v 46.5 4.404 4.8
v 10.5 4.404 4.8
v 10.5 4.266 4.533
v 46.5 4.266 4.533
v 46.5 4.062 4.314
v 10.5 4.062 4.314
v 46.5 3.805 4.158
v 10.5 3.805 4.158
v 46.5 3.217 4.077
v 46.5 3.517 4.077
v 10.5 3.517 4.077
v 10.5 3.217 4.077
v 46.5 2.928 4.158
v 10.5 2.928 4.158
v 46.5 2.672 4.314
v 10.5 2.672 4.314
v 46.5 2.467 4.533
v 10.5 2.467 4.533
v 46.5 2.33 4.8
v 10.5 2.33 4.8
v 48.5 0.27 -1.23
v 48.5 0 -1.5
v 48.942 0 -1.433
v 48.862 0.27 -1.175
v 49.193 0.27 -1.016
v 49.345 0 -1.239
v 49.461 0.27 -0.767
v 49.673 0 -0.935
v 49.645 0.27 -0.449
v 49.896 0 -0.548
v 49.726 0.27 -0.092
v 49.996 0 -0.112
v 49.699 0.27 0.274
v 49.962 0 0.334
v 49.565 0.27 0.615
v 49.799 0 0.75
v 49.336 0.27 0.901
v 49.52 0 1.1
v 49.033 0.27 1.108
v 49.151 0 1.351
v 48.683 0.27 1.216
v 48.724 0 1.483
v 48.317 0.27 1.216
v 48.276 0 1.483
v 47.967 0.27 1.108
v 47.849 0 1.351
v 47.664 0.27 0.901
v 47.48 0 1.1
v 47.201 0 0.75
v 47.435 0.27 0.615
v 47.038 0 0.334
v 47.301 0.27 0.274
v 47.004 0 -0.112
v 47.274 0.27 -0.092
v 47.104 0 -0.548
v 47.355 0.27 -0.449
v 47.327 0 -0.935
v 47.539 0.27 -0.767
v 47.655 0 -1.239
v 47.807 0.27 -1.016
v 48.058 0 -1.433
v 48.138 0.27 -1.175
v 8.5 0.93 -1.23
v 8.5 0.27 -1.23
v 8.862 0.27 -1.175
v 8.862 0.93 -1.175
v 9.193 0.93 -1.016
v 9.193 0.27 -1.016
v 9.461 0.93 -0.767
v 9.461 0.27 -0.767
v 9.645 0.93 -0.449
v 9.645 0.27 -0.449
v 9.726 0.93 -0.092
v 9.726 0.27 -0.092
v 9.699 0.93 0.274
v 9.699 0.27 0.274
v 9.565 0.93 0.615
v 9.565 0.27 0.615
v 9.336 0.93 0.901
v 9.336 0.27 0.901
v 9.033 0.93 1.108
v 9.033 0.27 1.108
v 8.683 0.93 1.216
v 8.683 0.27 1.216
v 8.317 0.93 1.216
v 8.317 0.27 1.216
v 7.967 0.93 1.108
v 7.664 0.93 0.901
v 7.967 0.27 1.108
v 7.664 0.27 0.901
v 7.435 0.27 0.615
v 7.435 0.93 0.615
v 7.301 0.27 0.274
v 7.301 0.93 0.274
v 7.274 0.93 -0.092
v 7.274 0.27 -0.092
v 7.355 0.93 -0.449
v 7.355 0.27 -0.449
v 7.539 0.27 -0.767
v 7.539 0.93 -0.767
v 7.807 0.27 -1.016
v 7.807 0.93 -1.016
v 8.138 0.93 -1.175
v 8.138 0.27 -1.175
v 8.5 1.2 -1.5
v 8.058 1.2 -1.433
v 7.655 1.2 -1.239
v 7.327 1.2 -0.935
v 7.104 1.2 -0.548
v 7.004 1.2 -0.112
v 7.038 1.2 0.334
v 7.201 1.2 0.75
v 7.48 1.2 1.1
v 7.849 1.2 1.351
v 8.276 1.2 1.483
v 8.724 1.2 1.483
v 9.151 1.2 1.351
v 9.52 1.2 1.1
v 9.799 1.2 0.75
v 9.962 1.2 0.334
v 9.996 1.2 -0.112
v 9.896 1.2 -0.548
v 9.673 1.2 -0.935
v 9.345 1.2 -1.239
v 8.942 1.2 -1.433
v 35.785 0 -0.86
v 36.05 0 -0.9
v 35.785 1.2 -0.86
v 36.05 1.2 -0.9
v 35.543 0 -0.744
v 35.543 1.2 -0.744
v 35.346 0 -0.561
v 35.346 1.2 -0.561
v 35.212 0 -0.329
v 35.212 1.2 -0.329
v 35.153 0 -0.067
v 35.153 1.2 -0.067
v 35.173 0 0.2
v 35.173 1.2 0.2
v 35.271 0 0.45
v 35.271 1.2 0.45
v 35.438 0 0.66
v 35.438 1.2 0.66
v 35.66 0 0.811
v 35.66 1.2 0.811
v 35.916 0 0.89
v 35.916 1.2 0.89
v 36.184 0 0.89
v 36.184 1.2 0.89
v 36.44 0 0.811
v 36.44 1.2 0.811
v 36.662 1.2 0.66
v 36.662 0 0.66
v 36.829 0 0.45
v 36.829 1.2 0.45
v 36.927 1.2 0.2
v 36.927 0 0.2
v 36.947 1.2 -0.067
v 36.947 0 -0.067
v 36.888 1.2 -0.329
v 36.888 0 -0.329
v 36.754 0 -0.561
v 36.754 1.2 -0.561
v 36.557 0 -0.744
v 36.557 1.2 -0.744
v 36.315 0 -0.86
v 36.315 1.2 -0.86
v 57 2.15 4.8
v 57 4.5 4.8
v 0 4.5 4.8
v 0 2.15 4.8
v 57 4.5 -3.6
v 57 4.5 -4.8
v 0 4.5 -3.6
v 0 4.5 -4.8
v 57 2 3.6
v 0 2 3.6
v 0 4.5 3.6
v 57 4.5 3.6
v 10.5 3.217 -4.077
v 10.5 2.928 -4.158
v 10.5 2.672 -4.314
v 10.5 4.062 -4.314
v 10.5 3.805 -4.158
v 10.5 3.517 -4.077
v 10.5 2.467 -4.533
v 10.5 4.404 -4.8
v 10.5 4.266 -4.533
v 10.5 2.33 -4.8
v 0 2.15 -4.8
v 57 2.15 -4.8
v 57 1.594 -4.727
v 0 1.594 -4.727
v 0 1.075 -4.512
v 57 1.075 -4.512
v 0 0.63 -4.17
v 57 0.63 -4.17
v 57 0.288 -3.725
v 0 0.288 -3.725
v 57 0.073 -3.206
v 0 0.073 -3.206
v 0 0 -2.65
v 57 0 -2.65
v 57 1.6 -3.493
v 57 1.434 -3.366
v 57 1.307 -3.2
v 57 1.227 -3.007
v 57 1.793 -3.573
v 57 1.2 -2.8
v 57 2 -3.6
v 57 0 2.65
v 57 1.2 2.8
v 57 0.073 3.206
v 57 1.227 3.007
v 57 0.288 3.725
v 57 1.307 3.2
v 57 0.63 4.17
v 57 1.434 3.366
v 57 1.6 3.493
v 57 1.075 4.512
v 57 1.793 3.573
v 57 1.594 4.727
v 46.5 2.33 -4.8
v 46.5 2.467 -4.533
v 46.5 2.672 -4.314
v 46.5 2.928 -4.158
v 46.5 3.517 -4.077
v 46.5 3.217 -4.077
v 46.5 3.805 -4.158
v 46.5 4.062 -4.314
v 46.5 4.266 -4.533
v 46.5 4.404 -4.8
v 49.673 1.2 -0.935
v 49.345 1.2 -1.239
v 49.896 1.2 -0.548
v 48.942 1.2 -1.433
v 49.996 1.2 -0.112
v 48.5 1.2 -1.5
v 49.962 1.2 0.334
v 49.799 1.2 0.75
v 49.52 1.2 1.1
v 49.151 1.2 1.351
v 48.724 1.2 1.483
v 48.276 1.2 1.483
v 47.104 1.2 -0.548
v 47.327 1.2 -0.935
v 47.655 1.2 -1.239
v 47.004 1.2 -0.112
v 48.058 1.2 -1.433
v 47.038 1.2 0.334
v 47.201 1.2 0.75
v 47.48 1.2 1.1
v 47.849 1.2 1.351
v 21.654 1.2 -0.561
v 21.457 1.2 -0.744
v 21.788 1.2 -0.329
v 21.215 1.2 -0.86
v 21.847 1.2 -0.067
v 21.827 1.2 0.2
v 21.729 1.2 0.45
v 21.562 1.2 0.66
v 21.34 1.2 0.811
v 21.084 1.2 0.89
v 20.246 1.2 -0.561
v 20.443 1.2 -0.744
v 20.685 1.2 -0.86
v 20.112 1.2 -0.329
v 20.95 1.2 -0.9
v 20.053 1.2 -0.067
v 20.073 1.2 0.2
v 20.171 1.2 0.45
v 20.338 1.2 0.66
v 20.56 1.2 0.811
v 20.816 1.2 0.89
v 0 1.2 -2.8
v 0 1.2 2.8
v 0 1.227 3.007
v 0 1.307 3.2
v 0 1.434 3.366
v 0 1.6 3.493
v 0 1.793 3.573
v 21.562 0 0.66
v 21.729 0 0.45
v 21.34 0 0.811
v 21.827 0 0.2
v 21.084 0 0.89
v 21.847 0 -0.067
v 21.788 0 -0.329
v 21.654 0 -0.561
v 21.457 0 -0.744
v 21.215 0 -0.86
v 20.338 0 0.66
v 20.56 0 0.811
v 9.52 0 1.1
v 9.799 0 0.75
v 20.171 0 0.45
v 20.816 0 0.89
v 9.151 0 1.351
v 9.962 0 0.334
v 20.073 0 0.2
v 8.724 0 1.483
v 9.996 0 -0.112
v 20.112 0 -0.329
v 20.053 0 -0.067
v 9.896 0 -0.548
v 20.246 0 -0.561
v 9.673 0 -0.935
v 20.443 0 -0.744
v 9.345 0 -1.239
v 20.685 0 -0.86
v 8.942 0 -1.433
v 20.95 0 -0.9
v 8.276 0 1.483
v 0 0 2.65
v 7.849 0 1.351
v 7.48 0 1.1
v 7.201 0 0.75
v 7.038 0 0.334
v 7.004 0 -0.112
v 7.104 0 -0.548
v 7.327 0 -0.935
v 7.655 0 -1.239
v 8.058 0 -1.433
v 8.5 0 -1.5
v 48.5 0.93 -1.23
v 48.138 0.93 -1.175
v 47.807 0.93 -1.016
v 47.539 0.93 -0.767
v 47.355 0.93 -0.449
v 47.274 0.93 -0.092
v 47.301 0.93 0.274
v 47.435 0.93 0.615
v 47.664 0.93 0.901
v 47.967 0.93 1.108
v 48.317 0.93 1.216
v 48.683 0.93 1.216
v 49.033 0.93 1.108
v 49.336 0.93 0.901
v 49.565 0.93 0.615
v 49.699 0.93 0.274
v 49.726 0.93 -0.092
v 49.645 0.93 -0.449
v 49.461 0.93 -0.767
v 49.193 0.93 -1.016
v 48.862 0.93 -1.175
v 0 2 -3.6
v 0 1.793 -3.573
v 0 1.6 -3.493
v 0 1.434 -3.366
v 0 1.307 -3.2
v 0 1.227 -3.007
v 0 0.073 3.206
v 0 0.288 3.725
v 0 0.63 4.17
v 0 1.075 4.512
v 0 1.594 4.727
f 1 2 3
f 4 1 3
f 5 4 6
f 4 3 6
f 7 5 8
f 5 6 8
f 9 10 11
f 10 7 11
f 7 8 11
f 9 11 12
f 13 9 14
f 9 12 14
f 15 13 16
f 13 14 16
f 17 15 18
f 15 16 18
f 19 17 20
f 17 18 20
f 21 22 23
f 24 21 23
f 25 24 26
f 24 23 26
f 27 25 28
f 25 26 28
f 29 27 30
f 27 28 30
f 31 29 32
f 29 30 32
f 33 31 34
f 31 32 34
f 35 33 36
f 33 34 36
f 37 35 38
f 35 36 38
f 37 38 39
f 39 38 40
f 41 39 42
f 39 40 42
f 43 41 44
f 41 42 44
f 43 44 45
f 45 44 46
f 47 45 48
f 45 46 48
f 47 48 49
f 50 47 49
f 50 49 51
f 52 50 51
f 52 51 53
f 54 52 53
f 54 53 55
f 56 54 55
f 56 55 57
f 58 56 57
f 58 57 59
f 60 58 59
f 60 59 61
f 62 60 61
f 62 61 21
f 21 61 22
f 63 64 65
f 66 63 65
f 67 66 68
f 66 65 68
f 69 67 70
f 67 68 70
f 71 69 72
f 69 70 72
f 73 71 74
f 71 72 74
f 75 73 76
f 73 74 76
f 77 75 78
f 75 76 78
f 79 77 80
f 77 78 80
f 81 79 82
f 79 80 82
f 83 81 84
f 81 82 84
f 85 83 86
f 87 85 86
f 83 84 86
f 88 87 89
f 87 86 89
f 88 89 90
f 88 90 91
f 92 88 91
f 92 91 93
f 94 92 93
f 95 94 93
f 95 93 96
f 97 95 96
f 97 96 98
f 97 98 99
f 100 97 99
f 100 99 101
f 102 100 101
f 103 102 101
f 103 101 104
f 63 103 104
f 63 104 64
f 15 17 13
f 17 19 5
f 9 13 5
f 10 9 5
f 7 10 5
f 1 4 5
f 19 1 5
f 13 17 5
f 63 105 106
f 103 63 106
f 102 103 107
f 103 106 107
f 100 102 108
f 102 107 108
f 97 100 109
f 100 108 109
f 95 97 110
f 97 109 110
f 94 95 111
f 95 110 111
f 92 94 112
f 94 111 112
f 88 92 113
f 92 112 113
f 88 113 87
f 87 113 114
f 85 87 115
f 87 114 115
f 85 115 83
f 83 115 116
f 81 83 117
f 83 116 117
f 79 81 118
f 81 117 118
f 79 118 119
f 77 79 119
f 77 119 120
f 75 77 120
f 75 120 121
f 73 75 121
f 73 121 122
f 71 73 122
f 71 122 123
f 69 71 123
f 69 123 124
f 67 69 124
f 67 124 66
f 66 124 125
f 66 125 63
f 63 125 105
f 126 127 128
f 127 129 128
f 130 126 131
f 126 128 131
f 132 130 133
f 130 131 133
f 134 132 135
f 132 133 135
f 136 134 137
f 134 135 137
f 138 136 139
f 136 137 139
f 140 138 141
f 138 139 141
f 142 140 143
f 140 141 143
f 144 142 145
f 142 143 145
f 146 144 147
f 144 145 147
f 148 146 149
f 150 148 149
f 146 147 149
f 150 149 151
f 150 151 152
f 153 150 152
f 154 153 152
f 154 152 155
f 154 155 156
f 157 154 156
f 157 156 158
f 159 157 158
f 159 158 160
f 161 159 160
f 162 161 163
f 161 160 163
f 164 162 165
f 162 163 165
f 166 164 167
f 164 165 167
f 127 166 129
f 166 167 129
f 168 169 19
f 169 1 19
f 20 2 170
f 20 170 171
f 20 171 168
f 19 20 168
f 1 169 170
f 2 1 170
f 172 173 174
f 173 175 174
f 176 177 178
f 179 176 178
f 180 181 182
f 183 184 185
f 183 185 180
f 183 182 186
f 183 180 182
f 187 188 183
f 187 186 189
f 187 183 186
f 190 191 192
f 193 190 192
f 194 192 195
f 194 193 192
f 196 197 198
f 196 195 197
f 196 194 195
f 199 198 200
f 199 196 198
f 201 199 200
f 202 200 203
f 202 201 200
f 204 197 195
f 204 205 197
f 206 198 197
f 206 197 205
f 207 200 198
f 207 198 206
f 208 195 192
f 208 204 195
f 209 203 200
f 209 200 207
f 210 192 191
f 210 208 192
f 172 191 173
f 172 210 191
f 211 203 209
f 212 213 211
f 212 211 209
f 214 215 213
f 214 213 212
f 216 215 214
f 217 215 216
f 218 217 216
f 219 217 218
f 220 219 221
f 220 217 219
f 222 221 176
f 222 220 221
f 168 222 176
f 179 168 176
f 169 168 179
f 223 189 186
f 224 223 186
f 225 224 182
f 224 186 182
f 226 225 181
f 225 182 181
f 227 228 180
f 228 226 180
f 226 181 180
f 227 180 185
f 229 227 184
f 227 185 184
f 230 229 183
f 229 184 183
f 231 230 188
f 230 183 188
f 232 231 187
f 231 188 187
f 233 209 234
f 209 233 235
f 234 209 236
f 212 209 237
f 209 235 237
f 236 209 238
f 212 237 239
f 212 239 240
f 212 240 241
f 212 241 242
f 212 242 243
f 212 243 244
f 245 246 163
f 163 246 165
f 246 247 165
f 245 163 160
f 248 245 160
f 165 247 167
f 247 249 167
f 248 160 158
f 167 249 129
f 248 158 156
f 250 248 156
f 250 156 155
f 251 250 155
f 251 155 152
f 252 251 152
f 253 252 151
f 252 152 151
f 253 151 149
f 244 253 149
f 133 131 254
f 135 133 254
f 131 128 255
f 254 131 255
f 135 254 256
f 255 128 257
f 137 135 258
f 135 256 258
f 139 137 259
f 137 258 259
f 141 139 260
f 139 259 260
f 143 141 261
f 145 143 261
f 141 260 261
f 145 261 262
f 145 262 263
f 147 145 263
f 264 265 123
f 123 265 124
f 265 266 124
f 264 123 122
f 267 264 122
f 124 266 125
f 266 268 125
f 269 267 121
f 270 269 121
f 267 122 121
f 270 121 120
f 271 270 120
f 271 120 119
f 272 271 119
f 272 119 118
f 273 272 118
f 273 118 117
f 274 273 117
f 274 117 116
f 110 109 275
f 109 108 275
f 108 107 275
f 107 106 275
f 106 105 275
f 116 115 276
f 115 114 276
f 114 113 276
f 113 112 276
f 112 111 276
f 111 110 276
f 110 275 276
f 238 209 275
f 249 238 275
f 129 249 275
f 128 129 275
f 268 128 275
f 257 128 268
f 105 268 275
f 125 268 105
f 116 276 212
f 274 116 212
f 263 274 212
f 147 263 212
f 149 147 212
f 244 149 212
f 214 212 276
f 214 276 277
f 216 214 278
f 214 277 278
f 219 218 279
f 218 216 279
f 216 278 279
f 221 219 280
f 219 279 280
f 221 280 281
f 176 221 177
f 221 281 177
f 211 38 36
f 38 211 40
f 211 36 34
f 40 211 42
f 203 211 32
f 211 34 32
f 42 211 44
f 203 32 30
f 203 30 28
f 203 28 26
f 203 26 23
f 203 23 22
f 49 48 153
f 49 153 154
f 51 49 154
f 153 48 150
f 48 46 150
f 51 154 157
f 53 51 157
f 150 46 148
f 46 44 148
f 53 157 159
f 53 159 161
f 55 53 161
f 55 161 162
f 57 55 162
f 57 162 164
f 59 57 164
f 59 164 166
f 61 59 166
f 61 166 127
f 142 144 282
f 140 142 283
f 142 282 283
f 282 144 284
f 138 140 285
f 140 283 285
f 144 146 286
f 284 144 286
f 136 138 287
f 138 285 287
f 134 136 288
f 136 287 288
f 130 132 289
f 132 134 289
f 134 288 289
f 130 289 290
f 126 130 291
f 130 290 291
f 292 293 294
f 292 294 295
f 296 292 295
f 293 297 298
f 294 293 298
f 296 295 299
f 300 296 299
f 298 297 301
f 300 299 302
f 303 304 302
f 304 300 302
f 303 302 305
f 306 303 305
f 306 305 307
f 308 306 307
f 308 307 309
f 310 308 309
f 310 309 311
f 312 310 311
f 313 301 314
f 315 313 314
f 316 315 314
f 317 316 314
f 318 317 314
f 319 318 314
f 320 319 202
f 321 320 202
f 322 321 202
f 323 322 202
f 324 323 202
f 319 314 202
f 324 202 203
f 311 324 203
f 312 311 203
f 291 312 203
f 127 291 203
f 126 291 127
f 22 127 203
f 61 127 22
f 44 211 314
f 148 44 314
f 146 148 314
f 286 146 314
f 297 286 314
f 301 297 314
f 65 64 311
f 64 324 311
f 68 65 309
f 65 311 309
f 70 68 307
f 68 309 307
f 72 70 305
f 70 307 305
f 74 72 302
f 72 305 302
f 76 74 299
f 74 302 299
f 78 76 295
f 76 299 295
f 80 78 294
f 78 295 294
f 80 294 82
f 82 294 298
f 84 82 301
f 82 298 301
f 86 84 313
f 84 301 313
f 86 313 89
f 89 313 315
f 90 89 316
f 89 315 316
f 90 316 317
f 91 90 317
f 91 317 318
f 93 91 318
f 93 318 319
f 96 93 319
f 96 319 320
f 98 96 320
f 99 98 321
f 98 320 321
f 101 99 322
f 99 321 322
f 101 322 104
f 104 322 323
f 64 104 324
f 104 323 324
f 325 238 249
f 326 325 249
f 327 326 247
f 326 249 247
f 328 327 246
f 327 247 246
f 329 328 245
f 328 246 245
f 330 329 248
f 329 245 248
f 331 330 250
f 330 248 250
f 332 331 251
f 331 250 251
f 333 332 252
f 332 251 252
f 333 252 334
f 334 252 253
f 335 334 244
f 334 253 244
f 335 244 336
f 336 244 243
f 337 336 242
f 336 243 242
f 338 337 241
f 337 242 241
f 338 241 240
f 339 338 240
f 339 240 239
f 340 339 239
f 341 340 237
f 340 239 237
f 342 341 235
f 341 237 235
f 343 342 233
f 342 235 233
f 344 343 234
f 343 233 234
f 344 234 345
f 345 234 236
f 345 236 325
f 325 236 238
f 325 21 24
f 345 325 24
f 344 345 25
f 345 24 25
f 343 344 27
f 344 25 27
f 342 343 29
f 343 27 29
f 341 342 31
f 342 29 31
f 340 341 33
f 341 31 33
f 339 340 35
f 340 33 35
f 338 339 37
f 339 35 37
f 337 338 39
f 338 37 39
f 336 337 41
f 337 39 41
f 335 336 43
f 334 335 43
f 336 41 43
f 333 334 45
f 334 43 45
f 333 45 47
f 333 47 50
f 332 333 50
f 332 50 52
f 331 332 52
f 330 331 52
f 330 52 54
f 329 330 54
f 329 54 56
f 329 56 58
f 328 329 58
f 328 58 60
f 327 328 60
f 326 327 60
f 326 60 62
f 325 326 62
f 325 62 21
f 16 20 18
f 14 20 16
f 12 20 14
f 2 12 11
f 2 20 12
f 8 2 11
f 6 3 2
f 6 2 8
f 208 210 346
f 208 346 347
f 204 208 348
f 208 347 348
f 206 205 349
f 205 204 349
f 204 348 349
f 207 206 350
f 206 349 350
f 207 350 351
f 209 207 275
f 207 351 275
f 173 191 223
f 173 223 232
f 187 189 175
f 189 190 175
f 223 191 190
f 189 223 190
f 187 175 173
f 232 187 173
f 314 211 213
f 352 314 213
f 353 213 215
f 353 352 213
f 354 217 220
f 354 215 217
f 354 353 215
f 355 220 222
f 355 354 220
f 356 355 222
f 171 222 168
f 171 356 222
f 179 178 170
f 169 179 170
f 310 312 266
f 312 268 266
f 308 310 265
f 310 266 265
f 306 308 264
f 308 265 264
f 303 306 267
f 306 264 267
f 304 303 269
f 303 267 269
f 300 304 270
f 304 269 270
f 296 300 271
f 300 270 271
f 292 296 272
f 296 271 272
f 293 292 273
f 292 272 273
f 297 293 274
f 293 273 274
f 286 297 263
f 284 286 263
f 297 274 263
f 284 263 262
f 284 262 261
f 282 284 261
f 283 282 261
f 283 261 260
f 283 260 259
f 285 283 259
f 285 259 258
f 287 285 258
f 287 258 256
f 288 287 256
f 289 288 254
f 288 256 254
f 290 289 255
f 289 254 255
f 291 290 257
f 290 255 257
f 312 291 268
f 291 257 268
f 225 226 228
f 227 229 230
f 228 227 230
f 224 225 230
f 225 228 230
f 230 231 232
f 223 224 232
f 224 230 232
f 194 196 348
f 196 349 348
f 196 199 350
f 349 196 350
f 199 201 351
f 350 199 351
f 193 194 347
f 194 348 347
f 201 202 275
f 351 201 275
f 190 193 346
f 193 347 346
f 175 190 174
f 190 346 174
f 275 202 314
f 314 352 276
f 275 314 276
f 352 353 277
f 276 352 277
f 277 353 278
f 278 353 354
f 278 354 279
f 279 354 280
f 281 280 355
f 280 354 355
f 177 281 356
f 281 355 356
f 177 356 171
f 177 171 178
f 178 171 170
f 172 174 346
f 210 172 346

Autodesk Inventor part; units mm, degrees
sketch "Sketch_1" plane through (0, 0, 0) normal (1, 0, 0) x (0, 1, 0)
  line L0 (4.5, 4.8) -> (2.15, 4.8)
  arc A0 (2.15, 4.8) -> (0, 2.65) centre (2.15, 2.65) ccw
  line L1 (0, 2.65) -> (0, -2.65)
  arc A1 (0, -2.65) -> (2.15, -4.8) centre (2.15, -2.65) ccw
  line L2 (2.15, -4.8) -> (4.5, -4.8)
  line L3 (4.5, -4.8) -> (4.5, -3.6)
  line L4 (4.5, -3.6) -> (2, -3.6)
  arc A2 (1.2, -2.8) -> (2, -3.6) centre (2, -2.8) ccw
  line L5 (1.2, -2.8) -> (1.2, 2.8)
  arc A3 (2, 3.6) -> (1.2, 2.8) centre (2, 2.8) ccw
  line L6 (2, 3.6) -> (4.5, 3.6)
  line L7 (4.5, 3.6) -> (4.5, 4.8)
extrude "Extrusion1" add sketch "Sketch_1" along normal blind 57
sketch "Sketch_2" plane through (8.5, 0, 0) normal (1, 0, 0) x (0, 0, -1)
  line L0 (0, 0) -> (0, 1.2)
  line L1 (0, 1.2) -> (1.5, 1.2)
  line L2 (1.5, 1.2) -> (1.2295, 0.9295)
  line L3 (1.2295, 0.9295) -> (1.2295, 0.2705)
  line L4 (1.2295, 0.2705) -> (1.5, 0)
  line L5 (1.5, 0) -> (0, 0)
  line L6 (0, 0) -> (0, 1.2)
revolve "Revolution1" cut sketch "Sketch_2" angle 360 about axis through (8.5, 0, 0) along (0, -1, 0)
thread "Thread1" size "M3x0.5" class "6H" standard "ISO Metric profile" full length
sketch "Sketch_3" plane through (48.5, 0, 0) normal (1, 0, 0) x (0, 0, -1)
  line L0 (0, 0) -> (0, 1.2)
  line L1 (0, 1.2) -> (1.5, 1.2)
  line L2 (1.5, 1.2) -> (1.2295, 0.9295)
  line L3 (1.2295, 0.9295) -> (1.2295, 0.2705)
  line L4 (1.2295, 0.2705) -> (1.5, 0)
  line L5 (1.5, 0) -> (0, 0)
  line L6 (0, 0) -> (0, 1.2)
revolve "Revolution2" cut sketch "Sketch_3" angle 360 about axis through (48.5, 0, 0) along (0, -1, 0)
thread "Thread2" size "M3x0.5" class "6H" standard "ISO Metric profile" full length
sketch "Sketch4" plane through (0, 0, -2.65) normal (0, -1, 0) x (1, 0, 0)
  point P0 (20.95, 2.65)
hole "Hole1" at (20.95, 0, 0) direction (0, 1, 0) diameter 1.8 depth 1.2
sketch "Sketch5" plane through (0, 0, -2.65) normal (0, -1, 0) x (1, 0, 0)
  point P0 (36.05, 2.65)
hole "Hole2" at (36.05, 0, 0) direction (0, 1, 0) diameter 1.8 depth 1.2
sketch "Sketch_8" plane through (28.5, 0, 0) normal (1, 0, 0) x (0, 0, -1)
  arc A0 (5.1667, 4.4667) -> (5.1667, 2.2667) centre (5.1667, 3.3667) ccw
  line L0 (5.1667, 2.2667) -> (5.1667, 4.4667)
extrude "Extrusion2" cut sketch "Sketch_8" along normal mid plane 36
sketch "Sketch_10" plane through (28.5, 0, 0) normal (1, 0, 0) x (0, 0, -1)
  arc A0 (-5.1667, 2.2667) -> (-5.1667, 4.4667) centre (-5.1667, 3.3667) ccw
  line L0 (-5.1667, 4.4667) -> (-5.1667, 2.2667)
extrude "Extrusion3" cut sketch "Sketch_10" along normal mid plane 36
ref_plane "bspg_r2_XY" through (28.5, 4.5, 0) normal (1, 0, 0) x (0, 0, -1)
ref_plane "bspg_r2_YZ" through (28.5, 4.5, 0) normal (0, 0, -1) x (0, 1, 0)
ref_plane "bspg_r2_ZX" through (28.5, 4.5, 0) normal (0, 1, 0) x (1, 0, 0)
properties part number "BSPG1560 Rail"
